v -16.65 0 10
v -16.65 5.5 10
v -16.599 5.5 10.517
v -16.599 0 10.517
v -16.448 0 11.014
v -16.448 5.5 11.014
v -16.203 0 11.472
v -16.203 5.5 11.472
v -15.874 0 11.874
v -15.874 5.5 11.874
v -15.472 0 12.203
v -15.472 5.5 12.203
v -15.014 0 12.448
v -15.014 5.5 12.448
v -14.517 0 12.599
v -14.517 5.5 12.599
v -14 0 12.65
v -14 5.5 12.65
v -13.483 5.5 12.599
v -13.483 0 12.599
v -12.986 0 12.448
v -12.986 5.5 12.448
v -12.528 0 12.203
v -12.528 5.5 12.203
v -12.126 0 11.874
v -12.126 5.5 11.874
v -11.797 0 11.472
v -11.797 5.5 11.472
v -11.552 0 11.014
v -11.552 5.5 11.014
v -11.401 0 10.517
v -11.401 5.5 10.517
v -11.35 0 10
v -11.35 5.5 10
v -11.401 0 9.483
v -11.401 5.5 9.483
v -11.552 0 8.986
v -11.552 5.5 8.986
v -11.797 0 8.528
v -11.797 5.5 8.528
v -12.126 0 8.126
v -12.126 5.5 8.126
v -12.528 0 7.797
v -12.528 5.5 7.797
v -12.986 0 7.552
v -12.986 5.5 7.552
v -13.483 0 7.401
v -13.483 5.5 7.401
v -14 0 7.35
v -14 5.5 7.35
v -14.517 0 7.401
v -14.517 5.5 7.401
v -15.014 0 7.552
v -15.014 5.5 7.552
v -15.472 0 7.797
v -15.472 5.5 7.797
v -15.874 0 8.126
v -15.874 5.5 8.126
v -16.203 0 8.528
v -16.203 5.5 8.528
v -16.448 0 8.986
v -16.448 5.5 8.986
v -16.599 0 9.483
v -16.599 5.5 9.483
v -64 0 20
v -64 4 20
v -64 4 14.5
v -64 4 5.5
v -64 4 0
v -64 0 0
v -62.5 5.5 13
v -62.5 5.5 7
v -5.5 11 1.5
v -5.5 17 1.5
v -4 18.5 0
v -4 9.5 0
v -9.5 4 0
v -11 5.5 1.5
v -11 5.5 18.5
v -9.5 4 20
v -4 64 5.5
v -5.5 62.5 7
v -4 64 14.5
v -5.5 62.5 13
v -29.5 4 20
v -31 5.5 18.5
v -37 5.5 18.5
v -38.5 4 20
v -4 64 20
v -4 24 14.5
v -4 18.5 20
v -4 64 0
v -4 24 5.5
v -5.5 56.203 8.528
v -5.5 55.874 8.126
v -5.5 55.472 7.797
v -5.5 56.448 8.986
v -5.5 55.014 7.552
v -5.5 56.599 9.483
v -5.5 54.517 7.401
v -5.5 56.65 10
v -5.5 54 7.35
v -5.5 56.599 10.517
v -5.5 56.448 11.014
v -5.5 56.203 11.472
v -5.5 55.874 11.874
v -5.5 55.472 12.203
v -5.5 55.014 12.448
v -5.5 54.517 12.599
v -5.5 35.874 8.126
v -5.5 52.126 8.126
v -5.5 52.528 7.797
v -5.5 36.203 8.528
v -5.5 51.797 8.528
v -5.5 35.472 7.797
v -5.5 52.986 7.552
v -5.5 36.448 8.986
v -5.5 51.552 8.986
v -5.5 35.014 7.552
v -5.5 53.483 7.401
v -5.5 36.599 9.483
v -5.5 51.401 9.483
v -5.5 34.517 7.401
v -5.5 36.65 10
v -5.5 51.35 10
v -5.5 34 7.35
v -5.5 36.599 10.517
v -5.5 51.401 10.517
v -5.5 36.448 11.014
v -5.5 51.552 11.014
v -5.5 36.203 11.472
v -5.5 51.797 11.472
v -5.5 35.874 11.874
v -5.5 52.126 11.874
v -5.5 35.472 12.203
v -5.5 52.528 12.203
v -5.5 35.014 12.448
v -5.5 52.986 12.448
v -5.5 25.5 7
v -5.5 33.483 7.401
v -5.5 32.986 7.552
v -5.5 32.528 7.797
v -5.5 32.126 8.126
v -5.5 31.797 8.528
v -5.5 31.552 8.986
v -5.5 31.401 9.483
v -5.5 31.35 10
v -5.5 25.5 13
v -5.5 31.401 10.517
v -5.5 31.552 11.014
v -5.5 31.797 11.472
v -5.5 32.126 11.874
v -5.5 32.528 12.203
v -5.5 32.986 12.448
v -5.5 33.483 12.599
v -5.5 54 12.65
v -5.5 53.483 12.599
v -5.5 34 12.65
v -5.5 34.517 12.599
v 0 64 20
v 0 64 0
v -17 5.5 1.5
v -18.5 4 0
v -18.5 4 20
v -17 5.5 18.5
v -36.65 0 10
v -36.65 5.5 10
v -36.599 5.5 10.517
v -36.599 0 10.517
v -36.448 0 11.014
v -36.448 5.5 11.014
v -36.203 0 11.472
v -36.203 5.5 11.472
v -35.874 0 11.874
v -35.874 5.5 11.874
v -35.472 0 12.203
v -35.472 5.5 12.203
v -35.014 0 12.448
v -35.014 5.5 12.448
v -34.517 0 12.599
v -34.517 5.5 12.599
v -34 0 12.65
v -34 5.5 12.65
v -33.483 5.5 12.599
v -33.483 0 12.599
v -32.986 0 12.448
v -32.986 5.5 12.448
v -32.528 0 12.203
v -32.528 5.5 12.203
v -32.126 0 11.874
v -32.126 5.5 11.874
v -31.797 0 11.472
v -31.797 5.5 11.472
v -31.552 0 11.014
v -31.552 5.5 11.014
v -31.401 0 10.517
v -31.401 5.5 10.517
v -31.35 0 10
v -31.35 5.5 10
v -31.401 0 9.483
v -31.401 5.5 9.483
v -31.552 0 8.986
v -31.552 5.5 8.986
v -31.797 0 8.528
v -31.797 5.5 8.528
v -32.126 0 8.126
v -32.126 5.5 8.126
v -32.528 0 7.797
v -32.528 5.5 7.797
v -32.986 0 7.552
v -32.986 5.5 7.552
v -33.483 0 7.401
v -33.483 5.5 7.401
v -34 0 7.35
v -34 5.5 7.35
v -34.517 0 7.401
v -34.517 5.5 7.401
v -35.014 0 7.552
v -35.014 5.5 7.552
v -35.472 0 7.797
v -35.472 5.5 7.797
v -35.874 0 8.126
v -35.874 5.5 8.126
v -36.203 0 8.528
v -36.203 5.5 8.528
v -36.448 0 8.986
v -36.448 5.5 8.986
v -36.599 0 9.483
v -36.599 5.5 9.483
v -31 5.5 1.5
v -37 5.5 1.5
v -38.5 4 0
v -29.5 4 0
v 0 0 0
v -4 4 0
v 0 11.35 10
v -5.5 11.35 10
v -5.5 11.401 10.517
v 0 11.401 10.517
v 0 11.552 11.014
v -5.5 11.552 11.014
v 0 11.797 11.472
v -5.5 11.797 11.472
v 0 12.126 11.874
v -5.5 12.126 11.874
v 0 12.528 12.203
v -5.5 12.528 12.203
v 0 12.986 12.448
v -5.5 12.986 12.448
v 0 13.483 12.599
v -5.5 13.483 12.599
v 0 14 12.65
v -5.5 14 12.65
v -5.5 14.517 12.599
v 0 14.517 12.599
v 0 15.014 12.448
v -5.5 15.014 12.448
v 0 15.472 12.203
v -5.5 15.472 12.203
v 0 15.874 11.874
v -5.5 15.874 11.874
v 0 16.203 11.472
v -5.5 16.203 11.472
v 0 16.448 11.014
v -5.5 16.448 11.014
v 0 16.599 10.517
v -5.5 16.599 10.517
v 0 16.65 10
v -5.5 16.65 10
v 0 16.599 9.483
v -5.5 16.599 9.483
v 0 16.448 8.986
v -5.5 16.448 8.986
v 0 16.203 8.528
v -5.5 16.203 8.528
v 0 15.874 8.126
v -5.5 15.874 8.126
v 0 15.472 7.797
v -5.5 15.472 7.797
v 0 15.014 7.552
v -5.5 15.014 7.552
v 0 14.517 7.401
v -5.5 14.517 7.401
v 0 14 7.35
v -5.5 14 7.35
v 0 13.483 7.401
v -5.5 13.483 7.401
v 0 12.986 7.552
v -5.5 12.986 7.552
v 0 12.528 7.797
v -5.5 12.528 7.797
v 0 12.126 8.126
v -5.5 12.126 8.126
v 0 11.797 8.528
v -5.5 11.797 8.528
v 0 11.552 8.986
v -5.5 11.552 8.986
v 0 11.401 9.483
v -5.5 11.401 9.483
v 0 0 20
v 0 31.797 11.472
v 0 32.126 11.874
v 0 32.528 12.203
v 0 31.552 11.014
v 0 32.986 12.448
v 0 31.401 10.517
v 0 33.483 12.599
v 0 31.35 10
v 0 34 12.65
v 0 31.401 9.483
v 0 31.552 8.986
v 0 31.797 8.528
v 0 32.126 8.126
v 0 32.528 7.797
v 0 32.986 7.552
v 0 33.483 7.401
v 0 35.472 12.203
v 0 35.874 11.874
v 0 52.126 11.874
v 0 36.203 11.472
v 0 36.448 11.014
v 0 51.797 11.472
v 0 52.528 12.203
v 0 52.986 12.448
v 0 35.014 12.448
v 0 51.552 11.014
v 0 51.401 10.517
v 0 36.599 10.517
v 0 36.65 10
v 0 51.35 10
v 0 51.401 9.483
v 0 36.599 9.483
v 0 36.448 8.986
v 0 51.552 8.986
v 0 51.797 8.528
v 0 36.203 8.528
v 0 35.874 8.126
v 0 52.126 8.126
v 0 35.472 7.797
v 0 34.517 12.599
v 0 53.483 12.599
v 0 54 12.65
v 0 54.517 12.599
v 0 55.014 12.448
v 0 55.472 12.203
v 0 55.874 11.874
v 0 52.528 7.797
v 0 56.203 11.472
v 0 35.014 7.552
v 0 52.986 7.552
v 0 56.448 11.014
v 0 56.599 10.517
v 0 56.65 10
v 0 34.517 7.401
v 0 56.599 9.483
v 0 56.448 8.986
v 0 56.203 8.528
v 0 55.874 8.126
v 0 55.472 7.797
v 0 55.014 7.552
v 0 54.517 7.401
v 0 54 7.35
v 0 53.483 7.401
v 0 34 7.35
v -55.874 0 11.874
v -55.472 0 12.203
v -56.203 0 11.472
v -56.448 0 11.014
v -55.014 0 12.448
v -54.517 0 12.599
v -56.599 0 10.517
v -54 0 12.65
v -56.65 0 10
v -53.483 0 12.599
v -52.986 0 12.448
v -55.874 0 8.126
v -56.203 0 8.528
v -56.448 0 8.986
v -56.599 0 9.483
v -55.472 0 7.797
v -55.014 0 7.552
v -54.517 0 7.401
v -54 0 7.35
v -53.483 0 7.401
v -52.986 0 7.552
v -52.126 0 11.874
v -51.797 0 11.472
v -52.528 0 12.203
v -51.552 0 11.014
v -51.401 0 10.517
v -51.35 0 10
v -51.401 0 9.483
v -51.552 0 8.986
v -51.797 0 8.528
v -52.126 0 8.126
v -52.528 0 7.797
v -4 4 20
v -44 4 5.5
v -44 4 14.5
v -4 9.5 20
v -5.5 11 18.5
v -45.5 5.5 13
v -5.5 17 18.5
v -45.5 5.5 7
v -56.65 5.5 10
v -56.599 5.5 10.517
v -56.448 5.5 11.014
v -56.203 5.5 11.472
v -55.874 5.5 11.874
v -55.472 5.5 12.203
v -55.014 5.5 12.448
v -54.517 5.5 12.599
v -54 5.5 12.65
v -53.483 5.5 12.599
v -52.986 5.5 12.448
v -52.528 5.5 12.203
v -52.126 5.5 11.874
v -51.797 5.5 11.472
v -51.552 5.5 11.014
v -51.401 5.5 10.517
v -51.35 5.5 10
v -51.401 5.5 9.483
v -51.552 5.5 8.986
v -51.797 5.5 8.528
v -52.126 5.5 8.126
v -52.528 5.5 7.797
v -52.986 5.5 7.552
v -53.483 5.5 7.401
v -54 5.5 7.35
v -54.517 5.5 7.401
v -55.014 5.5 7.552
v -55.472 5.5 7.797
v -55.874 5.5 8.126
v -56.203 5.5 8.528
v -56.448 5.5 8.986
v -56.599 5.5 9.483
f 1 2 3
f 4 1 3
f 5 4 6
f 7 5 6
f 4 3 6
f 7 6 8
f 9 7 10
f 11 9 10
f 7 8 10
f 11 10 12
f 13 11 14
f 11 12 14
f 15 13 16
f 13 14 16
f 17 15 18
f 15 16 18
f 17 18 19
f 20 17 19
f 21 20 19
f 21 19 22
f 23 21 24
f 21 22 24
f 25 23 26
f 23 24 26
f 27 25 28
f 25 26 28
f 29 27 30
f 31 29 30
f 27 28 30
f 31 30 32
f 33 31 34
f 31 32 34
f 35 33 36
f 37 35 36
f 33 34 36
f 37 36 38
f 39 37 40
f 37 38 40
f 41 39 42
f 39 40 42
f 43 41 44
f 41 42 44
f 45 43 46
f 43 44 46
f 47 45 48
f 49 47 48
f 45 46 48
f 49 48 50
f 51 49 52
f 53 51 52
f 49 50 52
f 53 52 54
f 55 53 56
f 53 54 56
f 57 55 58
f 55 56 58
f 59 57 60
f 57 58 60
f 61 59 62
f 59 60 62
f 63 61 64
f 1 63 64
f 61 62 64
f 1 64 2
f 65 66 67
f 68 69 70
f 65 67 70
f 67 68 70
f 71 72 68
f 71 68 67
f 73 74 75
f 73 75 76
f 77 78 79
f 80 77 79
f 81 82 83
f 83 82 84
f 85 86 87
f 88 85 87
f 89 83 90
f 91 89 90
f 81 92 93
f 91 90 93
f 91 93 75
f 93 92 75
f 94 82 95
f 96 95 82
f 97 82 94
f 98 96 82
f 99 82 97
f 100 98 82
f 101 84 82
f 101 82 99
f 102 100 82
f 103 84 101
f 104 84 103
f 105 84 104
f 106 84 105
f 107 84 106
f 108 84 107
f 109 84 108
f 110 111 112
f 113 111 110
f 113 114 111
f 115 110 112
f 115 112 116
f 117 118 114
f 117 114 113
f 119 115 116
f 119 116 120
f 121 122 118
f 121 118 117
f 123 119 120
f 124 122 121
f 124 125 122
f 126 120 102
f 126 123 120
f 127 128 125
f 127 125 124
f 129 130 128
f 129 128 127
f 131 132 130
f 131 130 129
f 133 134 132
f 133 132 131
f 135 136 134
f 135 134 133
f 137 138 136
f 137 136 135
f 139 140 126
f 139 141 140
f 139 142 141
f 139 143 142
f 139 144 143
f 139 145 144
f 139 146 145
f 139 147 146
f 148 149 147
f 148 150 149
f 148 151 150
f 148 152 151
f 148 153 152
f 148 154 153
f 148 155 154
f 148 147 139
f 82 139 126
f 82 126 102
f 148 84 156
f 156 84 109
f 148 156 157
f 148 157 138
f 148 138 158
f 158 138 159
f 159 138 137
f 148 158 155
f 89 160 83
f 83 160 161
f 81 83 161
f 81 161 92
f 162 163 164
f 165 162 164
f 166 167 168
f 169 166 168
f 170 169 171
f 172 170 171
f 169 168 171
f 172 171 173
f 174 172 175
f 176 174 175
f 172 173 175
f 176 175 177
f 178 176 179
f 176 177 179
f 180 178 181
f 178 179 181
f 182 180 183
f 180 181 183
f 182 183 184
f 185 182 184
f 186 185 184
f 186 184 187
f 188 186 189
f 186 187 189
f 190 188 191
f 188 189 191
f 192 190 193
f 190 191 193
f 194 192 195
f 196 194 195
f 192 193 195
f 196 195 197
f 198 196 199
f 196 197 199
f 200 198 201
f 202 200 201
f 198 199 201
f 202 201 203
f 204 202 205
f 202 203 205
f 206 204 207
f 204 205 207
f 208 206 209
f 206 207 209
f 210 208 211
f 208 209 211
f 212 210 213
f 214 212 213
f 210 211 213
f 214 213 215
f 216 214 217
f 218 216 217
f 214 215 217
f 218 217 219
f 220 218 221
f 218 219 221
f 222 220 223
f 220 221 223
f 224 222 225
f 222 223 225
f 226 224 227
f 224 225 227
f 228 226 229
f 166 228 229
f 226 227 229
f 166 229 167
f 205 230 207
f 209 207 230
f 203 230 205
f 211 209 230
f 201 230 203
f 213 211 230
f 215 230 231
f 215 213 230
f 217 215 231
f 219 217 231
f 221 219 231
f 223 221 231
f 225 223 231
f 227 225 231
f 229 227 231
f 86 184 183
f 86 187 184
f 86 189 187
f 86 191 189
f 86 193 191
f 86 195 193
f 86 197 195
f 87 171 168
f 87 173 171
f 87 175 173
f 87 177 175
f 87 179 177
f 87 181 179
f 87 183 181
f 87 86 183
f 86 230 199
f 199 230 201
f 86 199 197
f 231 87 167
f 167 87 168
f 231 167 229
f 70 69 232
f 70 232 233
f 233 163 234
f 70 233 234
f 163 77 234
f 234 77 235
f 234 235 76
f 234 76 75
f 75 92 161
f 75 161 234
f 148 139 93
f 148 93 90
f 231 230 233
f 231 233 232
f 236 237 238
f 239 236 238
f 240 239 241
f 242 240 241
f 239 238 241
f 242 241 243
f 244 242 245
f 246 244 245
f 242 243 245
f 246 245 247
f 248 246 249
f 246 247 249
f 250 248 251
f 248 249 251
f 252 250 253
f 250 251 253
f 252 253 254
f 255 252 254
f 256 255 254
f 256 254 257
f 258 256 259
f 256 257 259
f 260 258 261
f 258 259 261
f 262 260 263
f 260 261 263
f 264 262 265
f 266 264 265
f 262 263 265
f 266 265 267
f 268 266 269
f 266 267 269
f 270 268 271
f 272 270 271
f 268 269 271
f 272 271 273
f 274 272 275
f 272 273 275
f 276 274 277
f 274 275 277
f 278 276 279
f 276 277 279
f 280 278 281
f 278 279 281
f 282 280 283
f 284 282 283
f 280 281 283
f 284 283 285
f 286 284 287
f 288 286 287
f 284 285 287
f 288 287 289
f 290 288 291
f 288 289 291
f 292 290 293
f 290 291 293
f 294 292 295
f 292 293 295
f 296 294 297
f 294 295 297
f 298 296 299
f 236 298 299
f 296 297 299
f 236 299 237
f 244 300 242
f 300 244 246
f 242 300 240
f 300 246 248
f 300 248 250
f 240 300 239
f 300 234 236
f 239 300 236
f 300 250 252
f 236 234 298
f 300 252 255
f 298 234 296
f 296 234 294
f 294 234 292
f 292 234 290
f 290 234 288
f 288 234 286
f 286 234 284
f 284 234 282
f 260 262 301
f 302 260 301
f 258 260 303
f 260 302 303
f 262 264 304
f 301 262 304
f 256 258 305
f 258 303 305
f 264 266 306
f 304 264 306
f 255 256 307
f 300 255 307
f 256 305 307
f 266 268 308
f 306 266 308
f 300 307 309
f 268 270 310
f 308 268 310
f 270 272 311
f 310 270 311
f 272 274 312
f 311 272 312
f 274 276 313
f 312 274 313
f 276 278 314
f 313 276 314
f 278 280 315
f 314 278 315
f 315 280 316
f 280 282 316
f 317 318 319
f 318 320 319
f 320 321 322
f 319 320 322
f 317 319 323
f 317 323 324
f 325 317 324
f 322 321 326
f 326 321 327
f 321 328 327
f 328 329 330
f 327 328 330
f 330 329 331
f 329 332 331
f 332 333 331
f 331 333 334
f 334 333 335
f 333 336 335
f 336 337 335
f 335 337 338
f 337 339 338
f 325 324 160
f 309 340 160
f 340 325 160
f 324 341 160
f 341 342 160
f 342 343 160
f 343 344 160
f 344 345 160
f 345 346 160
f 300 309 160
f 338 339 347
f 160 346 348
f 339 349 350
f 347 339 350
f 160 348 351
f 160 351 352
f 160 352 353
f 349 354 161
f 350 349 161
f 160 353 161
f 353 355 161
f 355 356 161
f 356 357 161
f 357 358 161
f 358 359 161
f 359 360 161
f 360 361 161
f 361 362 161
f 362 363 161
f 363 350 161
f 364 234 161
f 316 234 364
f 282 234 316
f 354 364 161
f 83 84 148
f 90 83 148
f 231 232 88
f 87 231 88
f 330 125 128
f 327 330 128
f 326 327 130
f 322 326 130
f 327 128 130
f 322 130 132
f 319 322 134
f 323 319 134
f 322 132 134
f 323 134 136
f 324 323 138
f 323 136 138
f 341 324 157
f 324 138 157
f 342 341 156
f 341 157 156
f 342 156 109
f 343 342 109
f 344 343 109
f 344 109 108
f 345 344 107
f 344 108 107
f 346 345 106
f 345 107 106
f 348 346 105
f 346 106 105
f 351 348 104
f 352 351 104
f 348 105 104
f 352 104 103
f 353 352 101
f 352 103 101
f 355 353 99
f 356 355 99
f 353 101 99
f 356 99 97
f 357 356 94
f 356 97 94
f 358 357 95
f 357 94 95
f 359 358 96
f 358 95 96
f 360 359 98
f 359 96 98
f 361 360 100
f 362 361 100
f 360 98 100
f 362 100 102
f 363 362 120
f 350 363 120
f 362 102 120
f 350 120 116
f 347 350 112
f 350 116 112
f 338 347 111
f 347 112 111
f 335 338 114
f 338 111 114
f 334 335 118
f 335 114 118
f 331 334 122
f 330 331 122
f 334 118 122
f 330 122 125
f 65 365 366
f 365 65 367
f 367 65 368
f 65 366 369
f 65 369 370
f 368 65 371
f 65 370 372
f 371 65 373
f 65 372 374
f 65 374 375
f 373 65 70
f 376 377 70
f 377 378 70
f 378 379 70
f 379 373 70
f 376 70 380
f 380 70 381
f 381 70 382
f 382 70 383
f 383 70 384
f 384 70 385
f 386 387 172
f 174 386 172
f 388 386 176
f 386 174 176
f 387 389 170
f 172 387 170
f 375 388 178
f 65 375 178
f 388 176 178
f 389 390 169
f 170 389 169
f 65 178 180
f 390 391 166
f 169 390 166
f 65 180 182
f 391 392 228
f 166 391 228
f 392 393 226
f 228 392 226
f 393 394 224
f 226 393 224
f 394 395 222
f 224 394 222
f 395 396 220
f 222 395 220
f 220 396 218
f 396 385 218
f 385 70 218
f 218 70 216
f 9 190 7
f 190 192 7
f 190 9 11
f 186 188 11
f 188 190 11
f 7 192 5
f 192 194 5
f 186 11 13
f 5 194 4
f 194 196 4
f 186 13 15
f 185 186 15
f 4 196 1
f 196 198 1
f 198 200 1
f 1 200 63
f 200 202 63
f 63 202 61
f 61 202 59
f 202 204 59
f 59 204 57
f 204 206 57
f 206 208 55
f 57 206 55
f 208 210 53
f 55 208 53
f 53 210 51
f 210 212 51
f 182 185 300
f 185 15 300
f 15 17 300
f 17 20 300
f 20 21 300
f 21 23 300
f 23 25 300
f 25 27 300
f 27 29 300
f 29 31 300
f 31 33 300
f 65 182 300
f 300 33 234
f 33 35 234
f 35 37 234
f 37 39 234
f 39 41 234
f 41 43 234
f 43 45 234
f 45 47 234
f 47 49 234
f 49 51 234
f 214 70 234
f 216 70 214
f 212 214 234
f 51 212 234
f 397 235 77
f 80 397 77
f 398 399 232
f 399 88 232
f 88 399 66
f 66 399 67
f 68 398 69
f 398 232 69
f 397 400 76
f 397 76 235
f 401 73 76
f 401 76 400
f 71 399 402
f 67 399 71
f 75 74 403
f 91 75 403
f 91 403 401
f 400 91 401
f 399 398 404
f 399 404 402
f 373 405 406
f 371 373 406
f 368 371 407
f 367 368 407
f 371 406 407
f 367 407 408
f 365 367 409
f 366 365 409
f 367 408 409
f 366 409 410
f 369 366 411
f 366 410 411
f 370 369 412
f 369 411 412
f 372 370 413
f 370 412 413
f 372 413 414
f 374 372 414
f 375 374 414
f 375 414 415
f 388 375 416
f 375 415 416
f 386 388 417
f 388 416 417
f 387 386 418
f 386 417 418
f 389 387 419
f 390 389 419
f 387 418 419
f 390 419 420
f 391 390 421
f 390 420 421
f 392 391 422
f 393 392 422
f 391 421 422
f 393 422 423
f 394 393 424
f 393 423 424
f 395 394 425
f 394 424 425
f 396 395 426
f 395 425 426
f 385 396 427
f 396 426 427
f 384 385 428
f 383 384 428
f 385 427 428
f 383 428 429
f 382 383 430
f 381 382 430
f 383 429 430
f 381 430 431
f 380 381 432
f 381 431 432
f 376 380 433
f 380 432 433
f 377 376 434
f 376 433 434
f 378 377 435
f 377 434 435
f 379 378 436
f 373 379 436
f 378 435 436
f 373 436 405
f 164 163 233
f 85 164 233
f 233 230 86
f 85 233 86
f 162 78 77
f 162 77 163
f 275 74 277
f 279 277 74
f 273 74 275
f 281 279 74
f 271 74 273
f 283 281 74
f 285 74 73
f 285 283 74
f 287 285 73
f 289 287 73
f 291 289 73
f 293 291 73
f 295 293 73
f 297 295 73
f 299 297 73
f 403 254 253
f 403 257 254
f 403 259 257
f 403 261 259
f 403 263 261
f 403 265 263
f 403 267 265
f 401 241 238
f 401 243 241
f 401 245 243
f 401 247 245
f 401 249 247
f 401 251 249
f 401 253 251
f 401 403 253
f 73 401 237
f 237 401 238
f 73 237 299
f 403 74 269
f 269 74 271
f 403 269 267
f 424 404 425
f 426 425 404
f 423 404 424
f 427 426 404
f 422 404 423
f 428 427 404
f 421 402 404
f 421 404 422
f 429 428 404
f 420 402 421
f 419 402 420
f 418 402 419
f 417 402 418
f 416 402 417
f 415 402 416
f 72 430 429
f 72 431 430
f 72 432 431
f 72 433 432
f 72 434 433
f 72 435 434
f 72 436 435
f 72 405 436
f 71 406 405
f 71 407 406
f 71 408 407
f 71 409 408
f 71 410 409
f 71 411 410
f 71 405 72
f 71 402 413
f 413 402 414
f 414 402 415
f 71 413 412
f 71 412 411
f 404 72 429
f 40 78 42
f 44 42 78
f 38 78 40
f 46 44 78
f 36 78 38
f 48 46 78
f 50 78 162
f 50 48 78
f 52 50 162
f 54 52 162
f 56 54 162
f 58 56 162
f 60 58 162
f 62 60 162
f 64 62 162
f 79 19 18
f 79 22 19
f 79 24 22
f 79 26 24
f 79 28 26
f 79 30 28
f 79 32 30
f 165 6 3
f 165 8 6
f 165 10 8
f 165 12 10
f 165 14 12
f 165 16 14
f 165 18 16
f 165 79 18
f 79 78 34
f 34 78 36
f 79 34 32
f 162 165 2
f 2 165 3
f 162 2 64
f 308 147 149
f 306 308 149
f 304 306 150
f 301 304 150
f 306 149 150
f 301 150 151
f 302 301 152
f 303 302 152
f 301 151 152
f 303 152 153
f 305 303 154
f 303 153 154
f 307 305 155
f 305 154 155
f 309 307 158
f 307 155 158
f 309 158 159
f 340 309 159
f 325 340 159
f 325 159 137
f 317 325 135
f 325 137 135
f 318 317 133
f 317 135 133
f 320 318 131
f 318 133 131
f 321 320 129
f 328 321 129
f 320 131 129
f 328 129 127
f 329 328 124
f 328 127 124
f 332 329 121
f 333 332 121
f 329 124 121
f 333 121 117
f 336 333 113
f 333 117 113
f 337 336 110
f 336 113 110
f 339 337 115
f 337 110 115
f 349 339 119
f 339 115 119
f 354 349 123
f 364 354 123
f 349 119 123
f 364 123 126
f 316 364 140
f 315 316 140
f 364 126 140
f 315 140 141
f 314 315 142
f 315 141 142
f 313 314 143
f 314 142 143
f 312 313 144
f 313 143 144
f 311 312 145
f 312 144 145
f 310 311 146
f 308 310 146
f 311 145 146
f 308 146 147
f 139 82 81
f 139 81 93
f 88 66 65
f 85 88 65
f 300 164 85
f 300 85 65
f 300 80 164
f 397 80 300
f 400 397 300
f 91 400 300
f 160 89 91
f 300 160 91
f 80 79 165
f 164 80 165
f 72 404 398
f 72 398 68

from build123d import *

# Parameters (mm, degrees)
F1_DEPTH  = 20
F2_W      = 9
F2_H      = 20
F2_W_2    = 20
F2_H_2    = 9
F3_DEPTH  = 1.5
F4_W      = 40
F4_H      = 9
F4_W_2    = 9
F4_H_2    = 20
F5_DEPTH  = 1.5
F6_SIZE   = 1.49999
F7_R      = 2.65
F8_DEPTH  = 5.5
F9_R      = 2.65
F10_DEPTH = 5.5


# Not quite as in the source:
# - a fillet or chamfer is up to 0.001 mm smaller than in the source, because OpenCascade refuses the exact size


with BuildPart() as f1:
    # F0 (on Top) → F1 (new body)
    with BuildSketch(Plane.XY):
        Polygon((-64, 0), (0, 0), (0, 64), (-4, 64), (-4, 4), (-64, 4), align=None)
    extrude(amount=F1_DEPTH)

    # F2 (on face) → F3 (join)
    with BuildSketch(Plane(origin=(0, 4, 0), x_dir=(-1, 0, 0), z_dir=(0, 1, 0))):
        with Locations((14, 10)):
            Rectangle(F2_W, F2_H)
        with Locations((34, 10)):
            Rectangle(F2_W, F2_H)
        with Locations((54, 10)):
            Rectangle(F2_W_2, F2_H_2)
    extrude(amount=F3_DEPTH)

    # F4 (on face) → F5 (join)
    with BuildSketch(Plane(origin=(-4, 0, 0), x_dir=(0, -1, 0), z_dir=(-1, 0, 0))):
        with Locations((-44, 10)):
            Rectangle(F4_W, F4_H)
        with Locations((-14, 10)):
            Rectangle(F4_W_2, F4_H_2)
    extrude(amount=F5_DEPTH)

    # F6 (size 1.5 in the source; OpenCascade refuses exactly that, so slightly less here)
    f6_edges = [f1.edges().sort_by_distance(p)[0] for p in [
        (-5.5, 64, 10),
        (-5.5, 44, 14.5),
        (-5.5, 44, 5.5),
        (-5.5, 24, 10),
        (-54, 5.5, 14.5),
        (-54, 5.5, 5.5),
        (-44, 5.5, 10),
        (-64, 5.5, 10),
        (-34, 5.5, 20),
        (-29.5, 5.5, 10),
        (-34, 5.5, 0),
        (-38.5, 5.5, 10),
        (-14, 5.5, 20),
        (-9.5, 5.5, 10),
        (-14, 5.5, 0),
        (-18.5, 5.5, 10),
        (-5.5, 9.5, 10),
        (-5.5, 14, 20),
        (-5.5, 18.5, 10),
        (-5.5, 14, 0),
    ]]
    chamfer(f6_edges, length=F6_SIZE)

    # F7 (on face) → F8 (cut, through all)
    with BuildSketch(Plane(origin=(0, 5.5, 0), x_dir=(-1, 0, 0), z_dir=(0, 1, 0))):
        with Locations((14, 10)):
            Circle(F7_R)
        with Locations((34, 10)):
            Circle(F7_R)
        with Locations((54, 10)):
            Circle(F7_R)
    extrude(amount=-F8_DEPTH, mode=Mode.SUBTRACT)

    # F9 (on face) → F10 (cut, through all)
    with BuildSketch(Plane(origin=(-5.5, 0, 0), x_dir=(0, -1, 0), z_dir=(-1, 0, 0))):
        with Locations((-54, 10)):
            Circle(F9_R)
        with Locations((-34, 10)):
            Circle(F9_R)
        with Locations((-14, 10)):
            Circle(F9_R)
    extrude(amount=-F10_DEPTH, mode=Mode.SUBTRACT)


solid = f1.part
